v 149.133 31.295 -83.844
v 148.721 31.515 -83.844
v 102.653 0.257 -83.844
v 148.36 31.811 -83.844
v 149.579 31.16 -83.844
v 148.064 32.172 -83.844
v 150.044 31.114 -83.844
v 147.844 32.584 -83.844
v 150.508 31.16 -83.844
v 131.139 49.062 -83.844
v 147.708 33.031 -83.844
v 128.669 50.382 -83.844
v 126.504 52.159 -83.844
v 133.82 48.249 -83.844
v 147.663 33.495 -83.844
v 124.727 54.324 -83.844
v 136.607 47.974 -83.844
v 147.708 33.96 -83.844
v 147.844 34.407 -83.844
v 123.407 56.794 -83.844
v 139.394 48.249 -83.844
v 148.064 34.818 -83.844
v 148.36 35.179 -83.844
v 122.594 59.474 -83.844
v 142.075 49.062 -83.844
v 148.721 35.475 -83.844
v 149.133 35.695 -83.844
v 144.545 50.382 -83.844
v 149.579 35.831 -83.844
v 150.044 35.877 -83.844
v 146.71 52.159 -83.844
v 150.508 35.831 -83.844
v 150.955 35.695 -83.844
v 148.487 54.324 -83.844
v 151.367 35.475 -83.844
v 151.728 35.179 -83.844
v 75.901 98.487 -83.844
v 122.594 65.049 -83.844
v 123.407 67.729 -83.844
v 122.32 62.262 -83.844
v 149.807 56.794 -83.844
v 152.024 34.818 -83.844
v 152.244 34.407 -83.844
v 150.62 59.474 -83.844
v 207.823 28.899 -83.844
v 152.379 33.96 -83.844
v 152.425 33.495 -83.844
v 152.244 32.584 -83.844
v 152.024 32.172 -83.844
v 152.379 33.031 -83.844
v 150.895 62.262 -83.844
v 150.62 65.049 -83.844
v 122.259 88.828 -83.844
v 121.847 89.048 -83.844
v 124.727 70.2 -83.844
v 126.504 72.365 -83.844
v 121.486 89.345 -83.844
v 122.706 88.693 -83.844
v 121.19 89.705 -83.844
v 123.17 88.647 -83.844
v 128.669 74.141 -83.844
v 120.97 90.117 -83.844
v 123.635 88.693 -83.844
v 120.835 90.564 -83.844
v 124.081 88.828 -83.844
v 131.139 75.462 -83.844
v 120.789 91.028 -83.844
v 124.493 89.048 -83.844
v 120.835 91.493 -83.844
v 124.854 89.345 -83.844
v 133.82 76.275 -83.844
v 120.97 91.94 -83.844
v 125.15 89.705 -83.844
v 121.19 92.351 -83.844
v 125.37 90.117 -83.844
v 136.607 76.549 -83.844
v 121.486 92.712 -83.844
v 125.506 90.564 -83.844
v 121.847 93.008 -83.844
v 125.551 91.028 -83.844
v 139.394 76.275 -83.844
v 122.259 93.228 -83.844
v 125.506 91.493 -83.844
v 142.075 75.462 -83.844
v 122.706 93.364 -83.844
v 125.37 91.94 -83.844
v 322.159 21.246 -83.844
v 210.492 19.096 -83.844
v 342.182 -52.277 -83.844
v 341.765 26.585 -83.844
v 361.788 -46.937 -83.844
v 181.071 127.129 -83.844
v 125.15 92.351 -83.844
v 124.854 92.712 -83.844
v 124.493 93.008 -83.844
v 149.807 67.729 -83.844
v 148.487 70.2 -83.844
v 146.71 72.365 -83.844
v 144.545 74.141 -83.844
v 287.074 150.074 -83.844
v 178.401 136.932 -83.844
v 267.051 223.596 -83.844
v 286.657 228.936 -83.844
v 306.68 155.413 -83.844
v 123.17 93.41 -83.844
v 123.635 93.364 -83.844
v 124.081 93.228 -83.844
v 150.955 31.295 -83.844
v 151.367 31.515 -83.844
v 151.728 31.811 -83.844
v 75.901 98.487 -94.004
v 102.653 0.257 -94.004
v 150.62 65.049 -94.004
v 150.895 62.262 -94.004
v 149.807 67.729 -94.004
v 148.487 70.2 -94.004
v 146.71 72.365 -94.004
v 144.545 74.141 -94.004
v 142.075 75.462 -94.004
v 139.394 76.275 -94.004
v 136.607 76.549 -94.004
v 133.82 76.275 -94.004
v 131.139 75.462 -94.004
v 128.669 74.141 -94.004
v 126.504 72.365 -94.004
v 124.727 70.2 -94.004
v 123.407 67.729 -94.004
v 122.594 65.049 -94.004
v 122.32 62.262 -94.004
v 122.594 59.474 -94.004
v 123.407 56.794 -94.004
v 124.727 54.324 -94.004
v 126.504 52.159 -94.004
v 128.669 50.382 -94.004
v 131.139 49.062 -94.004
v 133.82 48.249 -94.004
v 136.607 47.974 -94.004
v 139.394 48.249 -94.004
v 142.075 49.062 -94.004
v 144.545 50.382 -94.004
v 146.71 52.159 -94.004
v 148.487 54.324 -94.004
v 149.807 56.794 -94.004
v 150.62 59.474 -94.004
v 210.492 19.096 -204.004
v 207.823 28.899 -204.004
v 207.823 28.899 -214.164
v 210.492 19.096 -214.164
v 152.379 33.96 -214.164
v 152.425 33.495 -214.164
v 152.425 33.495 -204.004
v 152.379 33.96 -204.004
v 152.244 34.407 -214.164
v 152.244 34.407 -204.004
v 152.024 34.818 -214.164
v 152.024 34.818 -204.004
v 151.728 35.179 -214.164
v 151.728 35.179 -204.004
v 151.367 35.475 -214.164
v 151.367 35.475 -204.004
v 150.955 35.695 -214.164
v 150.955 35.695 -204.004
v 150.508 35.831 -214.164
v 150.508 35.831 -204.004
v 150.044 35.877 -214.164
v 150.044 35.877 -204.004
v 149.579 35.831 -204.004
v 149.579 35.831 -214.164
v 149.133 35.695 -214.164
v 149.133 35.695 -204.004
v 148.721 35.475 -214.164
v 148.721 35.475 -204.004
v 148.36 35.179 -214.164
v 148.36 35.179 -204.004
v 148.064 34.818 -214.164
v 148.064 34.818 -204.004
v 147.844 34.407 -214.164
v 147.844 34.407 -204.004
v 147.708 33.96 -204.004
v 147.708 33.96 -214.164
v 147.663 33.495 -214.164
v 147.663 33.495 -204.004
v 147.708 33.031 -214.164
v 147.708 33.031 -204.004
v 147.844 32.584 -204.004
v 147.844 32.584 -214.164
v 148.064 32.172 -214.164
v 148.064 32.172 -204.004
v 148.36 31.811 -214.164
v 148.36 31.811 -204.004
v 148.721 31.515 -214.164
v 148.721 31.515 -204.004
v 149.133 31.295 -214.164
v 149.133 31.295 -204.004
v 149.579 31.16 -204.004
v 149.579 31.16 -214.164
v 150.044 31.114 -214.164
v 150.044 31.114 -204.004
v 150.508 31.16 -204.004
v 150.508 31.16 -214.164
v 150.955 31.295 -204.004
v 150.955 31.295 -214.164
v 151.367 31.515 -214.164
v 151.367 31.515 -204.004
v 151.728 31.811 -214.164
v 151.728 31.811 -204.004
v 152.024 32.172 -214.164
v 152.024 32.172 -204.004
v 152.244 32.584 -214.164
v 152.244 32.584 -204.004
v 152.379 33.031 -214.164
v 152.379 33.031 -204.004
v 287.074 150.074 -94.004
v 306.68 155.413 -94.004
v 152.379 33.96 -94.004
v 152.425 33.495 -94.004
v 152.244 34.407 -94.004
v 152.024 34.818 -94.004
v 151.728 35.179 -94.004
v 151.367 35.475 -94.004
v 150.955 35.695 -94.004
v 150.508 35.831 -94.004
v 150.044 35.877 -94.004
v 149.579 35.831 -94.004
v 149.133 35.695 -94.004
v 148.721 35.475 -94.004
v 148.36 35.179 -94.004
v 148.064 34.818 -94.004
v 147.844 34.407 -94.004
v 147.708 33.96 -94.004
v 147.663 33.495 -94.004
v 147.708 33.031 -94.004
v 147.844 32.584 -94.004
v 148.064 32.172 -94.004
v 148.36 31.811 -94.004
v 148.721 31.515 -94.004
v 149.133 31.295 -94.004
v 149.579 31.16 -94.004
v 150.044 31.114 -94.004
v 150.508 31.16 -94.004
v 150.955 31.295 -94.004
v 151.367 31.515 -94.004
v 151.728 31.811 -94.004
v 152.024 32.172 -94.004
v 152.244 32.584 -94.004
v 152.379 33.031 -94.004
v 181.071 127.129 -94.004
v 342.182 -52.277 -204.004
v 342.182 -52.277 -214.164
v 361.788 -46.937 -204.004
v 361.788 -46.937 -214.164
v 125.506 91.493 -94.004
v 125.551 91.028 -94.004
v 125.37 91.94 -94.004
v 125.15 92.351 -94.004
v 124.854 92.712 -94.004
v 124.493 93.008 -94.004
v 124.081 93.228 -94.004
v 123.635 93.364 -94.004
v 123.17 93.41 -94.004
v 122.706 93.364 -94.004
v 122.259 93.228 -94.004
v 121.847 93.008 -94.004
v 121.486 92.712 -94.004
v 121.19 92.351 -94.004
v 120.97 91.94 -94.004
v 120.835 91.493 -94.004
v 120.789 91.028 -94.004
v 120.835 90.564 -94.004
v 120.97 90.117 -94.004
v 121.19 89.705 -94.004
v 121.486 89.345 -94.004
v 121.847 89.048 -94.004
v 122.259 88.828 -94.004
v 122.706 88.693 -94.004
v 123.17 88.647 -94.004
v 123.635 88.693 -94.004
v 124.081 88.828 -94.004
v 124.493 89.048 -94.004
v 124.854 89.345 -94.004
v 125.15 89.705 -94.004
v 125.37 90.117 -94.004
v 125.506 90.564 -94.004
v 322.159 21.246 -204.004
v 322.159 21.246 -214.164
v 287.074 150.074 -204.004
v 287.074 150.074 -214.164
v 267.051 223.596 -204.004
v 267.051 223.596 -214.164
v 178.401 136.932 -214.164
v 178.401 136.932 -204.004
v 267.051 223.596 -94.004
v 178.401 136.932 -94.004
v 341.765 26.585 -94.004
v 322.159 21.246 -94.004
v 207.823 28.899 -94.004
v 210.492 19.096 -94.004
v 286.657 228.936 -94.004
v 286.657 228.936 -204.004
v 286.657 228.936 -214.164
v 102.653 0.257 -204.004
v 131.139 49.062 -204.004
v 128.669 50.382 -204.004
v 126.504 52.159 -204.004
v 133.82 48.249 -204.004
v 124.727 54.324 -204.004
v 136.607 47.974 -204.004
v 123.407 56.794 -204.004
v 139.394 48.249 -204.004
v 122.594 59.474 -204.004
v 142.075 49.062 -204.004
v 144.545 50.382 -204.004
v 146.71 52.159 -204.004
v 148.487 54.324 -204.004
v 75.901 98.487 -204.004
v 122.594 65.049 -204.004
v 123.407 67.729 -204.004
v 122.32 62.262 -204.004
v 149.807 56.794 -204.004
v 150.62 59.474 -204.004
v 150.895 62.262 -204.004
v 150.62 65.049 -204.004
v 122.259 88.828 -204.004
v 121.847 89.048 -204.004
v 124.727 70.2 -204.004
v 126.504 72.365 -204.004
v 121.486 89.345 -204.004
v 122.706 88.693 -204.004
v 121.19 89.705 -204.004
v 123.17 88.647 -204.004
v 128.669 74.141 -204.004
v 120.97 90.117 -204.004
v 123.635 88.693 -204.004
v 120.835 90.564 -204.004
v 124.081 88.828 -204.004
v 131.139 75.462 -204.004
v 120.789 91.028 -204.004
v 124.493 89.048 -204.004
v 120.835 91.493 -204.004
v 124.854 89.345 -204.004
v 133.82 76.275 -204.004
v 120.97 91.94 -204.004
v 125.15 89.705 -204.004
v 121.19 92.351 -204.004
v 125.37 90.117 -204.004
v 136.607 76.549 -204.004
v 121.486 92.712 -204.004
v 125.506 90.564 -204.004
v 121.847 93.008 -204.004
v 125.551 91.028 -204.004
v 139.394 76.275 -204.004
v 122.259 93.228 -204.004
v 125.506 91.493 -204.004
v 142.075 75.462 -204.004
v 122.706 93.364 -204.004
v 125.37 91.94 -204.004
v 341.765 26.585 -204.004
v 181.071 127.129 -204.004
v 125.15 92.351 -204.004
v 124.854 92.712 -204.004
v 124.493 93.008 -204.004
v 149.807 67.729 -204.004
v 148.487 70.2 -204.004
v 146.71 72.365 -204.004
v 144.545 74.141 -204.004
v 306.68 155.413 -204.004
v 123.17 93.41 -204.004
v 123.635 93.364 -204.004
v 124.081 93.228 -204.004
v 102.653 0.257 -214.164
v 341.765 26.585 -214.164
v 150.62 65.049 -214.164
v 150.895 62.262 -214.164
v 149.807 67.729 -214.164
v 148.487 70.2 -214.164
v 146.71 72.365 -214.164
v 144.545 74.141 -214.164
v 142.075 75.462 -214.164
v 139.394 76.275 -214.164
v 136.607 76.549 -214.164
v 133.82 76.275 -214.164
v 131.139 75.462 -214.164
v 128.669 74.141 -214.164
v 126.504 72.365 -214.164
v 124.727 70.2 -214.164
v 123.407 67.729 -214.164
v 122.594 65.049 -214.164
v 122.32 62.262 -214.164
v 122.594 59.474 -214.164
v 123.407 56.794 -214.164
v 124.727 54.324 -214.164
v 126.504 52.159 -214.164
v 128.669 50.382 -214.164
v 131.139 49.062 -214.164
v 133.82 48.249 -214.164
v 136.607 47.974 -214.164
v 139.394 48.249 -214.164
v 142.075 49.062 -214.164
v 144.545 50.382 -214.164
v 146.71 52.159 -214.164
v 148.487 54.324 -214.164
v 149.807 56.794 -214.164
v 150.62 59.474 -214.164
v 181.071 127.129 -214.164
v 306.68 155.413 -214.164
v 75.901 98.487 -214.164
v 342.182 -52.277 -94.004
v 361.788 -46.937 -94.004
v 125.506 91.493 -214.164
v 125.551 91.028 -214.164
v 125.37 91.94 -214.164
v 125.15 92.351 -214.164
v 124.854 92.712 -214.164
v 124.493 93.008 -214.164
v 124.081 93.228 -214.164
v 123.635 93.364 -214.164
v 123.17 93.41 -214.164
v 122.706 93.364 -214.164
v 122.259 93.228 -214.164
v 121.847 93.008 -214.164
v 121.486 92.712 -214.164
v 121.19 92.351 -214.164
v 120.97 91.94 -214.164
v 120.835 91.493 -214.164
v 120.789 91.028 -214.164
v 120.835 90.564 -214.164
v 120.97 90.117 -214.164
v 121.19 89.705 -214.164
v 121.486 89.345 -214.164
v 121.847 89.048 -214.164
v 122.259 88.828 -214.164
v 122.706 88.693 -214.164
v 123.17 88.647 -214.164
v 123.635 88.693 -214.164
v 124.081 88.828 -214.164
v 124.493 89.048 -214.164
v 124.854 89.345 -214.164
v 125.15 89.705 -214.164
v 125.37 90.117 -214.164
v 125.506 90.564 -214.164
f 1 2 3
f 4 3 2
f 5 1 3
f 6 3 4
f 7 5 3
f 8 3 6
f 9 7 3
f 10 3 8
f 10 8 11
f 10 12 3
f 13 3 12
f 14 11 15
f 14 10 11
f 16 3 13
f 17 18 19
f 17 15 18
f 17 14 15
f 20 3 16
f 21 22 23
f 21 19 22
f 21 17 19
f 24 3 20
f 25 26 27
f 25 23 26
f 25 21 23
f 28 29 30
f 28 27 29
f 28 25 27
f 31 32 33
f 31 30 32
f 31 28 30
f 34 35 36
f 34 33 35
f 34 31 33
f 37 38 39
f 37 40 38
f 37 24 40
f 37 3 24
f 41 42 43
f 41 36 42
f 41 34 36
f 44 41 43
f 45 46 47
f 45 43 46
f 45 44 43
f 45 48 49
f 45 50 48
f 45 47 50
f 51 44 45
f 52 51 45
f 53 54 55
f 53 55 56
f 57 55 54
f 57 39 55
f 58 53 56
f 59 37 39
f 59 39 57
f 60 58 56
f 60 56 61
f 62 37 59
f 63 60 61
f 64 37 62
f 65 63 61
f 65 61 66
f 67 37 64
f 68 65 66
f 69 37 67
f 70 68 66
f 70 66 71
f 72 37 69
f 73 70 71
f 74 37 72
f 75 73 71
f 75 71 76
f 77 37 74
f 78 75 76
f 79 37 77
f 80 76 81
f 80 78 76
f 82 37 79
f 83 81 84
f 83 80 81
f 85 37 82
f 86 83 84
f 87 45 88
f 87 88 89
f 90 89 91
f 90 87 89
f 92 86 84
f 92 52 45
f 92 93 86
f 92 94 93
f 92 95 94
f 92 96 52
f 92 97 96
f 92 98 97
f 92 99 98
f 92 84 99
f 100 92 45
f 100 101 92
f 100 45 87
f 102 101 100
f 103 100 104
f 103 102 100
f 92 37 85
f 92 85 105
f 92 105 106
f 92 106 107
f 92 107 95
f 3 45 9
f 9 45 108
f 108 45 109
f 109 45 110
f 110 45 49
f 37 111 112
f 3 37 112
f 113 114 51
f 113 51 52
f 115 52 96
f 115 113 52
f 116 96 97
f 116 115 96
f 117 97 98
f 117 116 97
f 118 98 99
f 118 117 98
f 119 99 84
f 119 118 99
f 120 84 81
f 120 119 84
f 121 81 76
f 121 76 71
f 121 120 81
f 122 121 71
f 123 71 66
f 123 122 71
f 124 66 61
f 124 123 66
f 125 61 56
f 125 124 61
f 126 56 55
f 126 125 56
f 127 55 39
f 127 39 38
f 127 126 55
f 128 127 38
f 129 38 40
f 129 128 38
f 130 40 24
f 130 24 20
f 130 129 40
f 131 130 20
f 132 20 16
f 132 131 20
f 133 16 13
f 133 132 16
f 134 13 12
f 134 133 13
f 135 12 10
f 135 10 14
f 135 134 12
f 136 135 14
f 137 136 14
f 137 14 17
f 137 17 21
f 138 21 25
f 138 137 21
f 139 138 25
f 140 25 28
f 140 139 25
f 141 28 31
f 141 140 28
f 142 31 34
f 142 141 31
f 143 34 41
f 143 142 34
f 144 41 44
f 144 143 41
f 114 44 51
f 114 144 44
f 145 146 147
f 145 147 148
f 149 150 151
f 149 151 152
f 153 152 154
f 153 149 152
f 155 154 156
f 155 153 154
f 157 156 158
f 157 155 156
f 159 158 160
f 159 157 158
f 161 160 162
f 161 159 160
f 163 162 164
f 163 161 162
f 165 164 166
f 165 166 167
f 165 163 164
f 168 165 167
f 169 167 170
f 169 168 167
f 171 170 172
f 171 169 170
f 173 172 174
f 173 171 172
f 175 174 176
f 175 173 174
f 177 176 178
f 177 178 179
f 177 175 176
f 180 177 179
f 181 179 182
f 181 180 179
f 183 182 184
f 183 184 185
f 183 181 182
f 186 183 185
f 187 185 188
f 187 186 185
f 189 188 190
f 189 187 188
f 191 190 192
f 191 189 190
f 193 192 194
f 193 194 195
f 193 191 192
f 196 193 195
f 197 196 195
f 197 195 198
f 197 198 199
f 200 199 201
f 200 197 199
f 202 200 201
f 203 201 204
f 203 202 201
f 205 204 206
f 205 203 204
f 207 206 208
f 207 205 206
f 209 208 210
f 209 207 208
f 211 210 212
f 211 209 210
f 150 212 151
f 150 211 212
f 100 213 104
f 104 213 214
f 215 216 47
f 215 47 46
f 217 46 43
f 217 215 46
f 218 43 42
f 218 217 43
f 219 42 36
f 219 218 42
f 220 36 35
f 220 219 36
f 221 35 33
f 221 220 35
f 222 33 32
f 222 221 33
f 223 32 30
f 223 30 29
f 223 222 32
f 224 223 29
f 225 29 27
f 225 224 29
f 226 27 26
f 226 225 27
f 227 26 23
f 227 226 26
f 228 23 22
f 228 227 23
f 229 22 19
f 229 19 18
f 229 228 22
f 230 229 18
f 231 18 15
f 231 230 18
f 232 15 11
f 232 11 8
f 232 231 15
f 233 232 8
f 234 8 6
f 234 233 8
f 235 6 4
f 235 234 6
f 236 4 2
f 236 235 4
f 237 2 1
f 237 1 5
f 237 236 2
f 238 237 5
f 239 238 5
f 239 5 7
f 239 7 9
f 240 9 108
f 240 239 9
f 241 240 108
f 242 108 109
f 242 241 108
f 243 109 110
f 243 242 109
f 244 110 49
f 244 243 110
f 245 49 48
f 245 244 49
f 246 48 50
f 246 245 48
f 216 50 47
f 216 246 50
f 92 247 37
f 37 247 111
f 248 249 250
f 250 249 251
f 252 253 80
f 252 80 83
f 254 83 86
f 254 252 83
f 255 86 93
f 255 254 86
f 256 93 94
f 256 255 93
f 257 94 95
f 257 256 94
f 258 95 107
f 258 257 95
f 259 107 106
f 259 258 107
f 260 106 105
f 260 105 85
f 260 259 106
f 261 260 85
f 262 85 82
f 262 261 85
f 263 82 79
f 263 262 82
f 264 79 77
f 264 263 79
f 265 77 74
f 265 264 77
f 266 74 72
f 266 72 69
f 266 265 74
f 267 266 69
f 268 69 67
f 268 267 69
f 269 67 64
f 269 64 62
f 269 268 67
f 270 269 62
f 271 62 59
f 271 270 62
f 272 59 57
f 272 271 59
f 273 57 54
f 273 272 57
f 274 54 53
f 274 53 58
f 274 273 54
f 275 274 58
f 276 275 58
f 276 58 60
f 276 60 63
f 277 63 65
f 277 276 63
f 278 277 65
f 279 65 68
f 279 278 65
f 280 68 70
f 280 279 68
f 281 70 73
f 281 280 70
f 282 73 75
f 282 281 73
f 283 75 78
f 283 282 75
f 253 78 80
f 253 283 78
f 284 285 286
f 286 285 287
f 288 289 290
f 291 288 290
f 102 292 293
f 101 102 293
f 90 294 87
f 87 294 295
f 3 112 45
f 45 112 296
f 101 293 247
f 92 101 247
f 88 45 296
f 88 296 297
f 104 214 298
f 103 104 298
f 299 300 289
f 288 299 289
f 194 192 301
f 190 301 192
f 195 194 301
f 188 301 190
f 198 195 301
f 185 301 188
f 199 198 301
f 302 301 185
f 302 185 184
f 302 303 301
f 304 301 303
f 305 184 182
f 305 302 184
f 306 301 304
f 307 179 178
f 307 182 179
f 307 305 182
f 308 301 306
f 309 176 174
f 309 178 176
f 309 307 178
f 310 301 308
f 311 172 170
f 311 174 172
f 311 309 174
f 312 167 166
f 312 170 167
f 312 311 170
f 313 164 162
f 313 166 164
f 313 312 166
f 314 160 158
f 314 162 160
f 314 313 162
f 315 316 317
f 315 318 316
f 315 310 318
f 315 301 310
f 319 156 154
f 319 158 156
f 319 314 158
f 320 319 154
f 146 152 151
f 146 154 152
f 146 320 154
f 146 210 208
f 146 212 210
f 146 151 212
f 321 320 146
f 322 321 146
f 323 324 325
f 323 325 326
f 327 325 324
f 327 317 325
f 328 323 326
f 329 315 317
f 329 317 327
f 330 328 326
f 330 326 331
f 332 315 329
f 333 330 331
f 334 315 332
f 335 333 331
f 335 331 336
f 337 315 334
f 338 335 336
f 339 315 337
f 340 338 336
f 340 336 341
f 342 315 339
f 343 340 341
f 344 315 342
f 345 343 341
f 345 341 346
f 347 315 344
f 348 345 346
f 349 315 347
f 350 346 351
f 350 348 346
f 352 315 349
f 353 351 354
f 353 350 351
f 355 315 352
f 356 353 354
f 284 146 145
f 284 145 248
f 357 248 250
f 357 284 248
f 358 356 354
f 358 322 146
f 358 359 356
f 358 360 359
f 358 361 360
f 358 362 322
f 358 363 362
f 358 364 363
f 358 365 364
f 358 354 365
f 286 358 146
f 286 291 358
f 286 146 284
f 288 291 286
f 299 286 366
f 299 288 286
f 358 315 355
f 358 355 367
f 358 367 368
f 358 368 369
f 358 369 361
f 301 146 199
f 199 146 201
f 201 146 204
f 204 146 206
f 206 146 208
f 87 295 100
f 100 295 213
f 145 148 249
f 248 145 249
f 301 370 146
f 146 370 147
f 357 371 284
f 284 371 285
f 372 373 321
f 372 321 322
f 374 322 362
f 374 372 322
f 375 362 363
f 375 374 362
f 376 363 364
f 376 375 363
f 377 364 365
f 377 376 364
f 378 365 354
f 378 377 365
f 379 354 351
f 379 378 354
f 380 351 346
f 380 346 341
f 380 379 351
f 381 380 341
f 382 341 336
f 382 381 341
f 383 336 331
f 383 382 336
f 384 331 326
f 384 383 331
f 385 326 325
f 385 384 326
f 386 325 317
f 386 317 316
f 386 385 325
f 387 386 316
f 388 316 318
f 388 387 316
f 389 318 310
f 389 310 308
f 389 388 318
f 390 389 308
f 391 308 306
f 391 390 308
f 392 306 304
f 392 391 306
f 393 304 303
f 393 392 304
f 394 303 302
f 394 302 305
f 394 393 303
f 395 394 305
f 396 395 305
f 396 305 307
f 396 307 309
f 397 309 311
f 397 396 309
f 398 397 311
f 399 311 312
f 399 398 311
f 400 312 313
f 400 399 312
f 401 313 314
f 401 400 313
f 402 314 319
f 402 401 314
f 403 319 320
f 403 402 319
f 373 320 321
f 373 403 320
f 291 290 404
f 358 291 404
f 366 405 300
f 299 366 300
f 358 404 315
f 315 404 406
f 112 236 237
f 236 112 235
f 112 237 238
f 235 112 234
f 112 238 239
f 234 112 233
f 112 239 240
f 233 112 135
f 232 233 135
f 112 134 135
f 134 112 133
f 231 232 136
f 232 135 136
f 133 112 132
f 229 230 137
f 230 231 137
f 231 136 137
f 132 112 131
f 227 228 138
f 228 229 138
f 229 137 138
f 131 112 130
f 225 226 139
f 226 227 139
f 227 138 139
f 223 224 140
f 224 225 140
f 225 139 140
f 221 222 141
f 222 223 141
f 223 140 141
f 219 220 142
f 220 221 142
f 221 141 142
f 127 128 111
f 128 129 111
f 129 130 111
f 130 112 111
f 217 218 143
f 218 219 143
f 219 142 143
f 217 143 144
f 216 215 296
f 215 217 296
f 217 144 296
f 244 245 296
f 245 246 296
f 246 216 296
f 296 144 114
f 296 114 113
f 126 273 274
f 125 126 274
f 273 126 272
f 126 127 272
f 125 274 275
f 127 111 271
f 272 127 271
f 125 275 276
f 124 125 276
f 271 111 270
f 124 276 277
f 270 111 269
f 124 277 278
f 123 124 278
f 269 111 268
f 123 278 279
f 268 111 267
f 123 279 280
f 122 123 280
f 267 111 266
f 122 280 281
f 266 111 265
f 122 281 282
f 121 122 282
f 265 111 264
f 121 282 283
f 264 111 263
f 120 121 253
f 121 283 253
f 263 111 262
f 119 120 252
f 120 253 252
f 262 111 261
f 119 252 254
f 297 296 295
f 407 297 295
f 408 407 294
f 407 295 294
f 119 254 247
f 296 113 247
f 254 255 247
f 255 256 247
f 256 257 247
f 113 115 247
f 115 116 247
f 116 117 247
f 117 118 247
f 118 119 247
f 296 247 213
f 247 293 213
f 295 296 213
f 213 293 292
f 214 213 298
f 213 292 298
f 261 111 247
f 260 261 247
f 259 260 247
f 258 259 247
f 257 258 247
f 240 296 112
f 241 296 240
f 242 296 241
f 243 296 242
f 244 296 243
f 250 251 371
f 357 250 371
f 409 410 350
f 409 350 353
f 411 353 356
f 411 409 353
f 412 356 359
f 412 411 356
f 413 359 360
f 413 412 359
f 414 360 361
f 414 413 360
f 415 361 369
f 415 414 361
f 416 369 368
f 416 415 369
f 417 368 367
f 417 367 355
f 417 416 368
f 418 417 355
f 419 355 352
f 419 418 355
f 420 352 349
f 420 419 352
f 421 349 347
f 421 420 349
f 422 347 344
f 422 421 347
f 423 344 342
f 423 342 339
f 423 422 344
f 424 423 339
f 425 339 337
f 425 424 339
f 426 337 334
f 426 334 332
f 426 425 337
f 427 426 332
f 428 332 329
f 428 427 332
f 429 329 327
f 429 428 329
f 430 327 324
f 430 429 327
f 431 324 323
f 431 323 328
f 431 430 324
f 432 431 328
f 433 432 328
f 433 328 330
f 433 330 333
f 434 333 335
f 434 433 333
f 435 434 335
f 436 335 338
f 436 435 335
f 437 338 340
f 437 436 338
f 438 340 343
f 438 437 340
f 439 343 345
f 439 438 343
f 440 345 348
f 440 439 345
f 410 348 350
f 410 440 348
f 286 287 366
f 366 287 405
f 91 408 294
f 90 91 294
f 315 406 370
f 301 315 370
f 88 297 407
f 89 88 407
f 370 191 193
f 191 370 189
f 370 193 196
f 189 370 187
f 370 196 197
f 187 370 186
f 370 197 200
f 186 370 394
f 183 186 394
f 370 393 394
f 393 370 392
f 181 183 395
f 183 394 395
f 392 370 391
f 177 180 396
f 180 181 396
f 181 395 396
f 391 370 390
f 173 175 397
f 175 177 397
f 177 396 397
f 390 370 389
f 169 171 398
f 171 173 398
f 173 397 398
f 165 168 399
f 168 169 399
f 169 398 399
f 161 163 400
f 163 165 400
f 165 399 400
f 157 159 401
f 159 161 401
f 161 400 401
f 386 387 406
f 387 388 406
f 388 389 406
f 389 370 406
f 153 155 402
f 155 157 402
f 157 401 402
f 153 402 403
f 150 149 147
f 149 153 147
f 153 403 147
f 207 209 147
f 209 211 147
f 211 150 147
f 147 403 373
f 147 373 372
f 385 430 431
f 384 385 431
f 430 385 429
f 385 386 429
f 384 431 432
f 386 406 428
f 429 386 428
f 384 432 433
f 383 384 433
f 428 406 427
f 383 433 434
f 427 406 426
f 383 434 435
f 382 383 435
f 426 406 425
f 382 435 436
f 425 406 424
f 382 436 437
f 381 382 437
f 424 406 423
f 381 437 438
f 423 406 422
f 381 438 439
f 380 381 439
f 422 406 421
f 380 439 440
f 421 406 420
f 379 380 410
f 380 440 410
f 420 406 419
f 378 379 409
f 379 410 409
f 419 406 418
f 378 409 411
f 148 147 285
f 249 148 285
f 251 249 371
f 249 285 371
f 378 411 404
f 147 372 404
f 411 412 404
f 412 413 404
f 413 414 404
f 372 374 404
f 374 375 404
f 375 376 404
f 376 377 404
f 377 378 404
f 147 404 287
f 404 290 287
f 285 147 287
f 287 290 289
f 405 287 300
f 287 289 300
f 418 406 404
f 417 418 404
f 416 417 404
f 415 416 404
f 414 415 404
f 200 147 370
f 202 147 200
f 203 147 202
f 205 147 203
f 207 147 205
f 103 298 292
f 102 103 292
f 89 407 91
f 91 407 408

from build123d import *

# Parameters (mm, degrees)
BOSS_EXTRUDE1_START = -90
SKETCH1_R           = 14.2875
SKETCH1_R_2         = 2.38125
BOSS_EXTRUDE1_DEPTH = 10.16
BOSS_EXTRUDE2_START = -210.16
SKETCH1_2_R         = 14.2875
SKETCH1_2_R_2       = 2.38125
BOSS_EXTRUDE2_DEPTH = 10.16


with BuildPart() as part:
    # Sketch1 → Boss-Extrude1 (new body)
    with BuildSketch(Plane(origin=(2328.589821282, 466.462033654, -4.0040129), x_dir=(0.9648587645409115, 0.26276903259057416, 0), z_dir=(0, 0, 1)).offset(BOSS_EXTRUDE1_START)):
        Polygon((-2161.218921834, 236.892663878), (-2270.218921834, 236.892663878), (-2270.218921834, 135.08549762), (-2161.218921834, 135.08549762), (-2161.218921834, 124.92549762), (-2052.911580455, 21.456991118), (-2032.591580455, 21.456991118), (-2032.591580455, 97.656991118), (-2052.911580455, 97.656991118), (-2052.911580455, 231.177276923), (-2032.591580455, 231.177276923), (-2032.591580455, 307.377276923), (-2052.911580455, 307.377276923), (-2161.218921834, 247.052663878), align=None)
        with Locations((-2221.165130355, 185.989080749)):
            Circle(SKETCH1_R, mode=Mode.SUBTRACT)
        with Locations((-2226.570792022, 217.275520654)):
            Circle(SKETCH1_R_2, mode=Mode.SUBTRACT)
        with Locations((-2215.759468688, 154.702640844)):
            Circle(SKETCH1_R_2, mode=Mode.SUBTRACT)
    extrude(amount=BOSS_EXTRUDE1_DEPTH)


with BuildPart() as body_2:
    # Sketch1<2> → Boss-Extrude2 (new body)
    with BuildSketch(Plane(origin=(2328.589821282, 466.462033654, -4.0040129), x_dir=(0.9648587645409115, 0.26276903259057416, 0), z_dir=(0, 0, 1)).offset(BOSS_EXTRUDE2_START)):
        Polygon((-2161.218921834, 236.892663878), (-2270.218921834, 236.892663878), (-2270.218921834, 135.08549762), (-2161.218921834, 135.08549762), (-2161.218921834, 124.92549762), (-2052.911580455, 21.456991118), (-2032.591580455, 21.456991118), (-2032.591580455, 97.656991118), (-2052.911580455, 97.656991118), (-2052.911580455, 231.177276923), (-2032.591580455, 231.177276923), (-2032.591580455, 307.377276923), (-2052.911580455, 307.377276923), (-2161.218921834, 247.052663878), align=None)
        with Locations((-2221.165130355, 185.989080749)):
            Circle(SKETCH1_2_R, mode=Mode.SUBTRACT)
        with Locations((-2226.570792022, 217.275520654)):
            Circle(SKETCH1_2_R_2, mode=Mode.SUBTRACT)
        with Locations((-2215.759468688, 154.702640844)):
            Circle(SKETCH1_2_R_2, mode=Mode.SUBTRACT)
    extrude(amount=BOSS_EXTRUDE2_DEPTH)


solid = Compound([part.part, body_2.part])
